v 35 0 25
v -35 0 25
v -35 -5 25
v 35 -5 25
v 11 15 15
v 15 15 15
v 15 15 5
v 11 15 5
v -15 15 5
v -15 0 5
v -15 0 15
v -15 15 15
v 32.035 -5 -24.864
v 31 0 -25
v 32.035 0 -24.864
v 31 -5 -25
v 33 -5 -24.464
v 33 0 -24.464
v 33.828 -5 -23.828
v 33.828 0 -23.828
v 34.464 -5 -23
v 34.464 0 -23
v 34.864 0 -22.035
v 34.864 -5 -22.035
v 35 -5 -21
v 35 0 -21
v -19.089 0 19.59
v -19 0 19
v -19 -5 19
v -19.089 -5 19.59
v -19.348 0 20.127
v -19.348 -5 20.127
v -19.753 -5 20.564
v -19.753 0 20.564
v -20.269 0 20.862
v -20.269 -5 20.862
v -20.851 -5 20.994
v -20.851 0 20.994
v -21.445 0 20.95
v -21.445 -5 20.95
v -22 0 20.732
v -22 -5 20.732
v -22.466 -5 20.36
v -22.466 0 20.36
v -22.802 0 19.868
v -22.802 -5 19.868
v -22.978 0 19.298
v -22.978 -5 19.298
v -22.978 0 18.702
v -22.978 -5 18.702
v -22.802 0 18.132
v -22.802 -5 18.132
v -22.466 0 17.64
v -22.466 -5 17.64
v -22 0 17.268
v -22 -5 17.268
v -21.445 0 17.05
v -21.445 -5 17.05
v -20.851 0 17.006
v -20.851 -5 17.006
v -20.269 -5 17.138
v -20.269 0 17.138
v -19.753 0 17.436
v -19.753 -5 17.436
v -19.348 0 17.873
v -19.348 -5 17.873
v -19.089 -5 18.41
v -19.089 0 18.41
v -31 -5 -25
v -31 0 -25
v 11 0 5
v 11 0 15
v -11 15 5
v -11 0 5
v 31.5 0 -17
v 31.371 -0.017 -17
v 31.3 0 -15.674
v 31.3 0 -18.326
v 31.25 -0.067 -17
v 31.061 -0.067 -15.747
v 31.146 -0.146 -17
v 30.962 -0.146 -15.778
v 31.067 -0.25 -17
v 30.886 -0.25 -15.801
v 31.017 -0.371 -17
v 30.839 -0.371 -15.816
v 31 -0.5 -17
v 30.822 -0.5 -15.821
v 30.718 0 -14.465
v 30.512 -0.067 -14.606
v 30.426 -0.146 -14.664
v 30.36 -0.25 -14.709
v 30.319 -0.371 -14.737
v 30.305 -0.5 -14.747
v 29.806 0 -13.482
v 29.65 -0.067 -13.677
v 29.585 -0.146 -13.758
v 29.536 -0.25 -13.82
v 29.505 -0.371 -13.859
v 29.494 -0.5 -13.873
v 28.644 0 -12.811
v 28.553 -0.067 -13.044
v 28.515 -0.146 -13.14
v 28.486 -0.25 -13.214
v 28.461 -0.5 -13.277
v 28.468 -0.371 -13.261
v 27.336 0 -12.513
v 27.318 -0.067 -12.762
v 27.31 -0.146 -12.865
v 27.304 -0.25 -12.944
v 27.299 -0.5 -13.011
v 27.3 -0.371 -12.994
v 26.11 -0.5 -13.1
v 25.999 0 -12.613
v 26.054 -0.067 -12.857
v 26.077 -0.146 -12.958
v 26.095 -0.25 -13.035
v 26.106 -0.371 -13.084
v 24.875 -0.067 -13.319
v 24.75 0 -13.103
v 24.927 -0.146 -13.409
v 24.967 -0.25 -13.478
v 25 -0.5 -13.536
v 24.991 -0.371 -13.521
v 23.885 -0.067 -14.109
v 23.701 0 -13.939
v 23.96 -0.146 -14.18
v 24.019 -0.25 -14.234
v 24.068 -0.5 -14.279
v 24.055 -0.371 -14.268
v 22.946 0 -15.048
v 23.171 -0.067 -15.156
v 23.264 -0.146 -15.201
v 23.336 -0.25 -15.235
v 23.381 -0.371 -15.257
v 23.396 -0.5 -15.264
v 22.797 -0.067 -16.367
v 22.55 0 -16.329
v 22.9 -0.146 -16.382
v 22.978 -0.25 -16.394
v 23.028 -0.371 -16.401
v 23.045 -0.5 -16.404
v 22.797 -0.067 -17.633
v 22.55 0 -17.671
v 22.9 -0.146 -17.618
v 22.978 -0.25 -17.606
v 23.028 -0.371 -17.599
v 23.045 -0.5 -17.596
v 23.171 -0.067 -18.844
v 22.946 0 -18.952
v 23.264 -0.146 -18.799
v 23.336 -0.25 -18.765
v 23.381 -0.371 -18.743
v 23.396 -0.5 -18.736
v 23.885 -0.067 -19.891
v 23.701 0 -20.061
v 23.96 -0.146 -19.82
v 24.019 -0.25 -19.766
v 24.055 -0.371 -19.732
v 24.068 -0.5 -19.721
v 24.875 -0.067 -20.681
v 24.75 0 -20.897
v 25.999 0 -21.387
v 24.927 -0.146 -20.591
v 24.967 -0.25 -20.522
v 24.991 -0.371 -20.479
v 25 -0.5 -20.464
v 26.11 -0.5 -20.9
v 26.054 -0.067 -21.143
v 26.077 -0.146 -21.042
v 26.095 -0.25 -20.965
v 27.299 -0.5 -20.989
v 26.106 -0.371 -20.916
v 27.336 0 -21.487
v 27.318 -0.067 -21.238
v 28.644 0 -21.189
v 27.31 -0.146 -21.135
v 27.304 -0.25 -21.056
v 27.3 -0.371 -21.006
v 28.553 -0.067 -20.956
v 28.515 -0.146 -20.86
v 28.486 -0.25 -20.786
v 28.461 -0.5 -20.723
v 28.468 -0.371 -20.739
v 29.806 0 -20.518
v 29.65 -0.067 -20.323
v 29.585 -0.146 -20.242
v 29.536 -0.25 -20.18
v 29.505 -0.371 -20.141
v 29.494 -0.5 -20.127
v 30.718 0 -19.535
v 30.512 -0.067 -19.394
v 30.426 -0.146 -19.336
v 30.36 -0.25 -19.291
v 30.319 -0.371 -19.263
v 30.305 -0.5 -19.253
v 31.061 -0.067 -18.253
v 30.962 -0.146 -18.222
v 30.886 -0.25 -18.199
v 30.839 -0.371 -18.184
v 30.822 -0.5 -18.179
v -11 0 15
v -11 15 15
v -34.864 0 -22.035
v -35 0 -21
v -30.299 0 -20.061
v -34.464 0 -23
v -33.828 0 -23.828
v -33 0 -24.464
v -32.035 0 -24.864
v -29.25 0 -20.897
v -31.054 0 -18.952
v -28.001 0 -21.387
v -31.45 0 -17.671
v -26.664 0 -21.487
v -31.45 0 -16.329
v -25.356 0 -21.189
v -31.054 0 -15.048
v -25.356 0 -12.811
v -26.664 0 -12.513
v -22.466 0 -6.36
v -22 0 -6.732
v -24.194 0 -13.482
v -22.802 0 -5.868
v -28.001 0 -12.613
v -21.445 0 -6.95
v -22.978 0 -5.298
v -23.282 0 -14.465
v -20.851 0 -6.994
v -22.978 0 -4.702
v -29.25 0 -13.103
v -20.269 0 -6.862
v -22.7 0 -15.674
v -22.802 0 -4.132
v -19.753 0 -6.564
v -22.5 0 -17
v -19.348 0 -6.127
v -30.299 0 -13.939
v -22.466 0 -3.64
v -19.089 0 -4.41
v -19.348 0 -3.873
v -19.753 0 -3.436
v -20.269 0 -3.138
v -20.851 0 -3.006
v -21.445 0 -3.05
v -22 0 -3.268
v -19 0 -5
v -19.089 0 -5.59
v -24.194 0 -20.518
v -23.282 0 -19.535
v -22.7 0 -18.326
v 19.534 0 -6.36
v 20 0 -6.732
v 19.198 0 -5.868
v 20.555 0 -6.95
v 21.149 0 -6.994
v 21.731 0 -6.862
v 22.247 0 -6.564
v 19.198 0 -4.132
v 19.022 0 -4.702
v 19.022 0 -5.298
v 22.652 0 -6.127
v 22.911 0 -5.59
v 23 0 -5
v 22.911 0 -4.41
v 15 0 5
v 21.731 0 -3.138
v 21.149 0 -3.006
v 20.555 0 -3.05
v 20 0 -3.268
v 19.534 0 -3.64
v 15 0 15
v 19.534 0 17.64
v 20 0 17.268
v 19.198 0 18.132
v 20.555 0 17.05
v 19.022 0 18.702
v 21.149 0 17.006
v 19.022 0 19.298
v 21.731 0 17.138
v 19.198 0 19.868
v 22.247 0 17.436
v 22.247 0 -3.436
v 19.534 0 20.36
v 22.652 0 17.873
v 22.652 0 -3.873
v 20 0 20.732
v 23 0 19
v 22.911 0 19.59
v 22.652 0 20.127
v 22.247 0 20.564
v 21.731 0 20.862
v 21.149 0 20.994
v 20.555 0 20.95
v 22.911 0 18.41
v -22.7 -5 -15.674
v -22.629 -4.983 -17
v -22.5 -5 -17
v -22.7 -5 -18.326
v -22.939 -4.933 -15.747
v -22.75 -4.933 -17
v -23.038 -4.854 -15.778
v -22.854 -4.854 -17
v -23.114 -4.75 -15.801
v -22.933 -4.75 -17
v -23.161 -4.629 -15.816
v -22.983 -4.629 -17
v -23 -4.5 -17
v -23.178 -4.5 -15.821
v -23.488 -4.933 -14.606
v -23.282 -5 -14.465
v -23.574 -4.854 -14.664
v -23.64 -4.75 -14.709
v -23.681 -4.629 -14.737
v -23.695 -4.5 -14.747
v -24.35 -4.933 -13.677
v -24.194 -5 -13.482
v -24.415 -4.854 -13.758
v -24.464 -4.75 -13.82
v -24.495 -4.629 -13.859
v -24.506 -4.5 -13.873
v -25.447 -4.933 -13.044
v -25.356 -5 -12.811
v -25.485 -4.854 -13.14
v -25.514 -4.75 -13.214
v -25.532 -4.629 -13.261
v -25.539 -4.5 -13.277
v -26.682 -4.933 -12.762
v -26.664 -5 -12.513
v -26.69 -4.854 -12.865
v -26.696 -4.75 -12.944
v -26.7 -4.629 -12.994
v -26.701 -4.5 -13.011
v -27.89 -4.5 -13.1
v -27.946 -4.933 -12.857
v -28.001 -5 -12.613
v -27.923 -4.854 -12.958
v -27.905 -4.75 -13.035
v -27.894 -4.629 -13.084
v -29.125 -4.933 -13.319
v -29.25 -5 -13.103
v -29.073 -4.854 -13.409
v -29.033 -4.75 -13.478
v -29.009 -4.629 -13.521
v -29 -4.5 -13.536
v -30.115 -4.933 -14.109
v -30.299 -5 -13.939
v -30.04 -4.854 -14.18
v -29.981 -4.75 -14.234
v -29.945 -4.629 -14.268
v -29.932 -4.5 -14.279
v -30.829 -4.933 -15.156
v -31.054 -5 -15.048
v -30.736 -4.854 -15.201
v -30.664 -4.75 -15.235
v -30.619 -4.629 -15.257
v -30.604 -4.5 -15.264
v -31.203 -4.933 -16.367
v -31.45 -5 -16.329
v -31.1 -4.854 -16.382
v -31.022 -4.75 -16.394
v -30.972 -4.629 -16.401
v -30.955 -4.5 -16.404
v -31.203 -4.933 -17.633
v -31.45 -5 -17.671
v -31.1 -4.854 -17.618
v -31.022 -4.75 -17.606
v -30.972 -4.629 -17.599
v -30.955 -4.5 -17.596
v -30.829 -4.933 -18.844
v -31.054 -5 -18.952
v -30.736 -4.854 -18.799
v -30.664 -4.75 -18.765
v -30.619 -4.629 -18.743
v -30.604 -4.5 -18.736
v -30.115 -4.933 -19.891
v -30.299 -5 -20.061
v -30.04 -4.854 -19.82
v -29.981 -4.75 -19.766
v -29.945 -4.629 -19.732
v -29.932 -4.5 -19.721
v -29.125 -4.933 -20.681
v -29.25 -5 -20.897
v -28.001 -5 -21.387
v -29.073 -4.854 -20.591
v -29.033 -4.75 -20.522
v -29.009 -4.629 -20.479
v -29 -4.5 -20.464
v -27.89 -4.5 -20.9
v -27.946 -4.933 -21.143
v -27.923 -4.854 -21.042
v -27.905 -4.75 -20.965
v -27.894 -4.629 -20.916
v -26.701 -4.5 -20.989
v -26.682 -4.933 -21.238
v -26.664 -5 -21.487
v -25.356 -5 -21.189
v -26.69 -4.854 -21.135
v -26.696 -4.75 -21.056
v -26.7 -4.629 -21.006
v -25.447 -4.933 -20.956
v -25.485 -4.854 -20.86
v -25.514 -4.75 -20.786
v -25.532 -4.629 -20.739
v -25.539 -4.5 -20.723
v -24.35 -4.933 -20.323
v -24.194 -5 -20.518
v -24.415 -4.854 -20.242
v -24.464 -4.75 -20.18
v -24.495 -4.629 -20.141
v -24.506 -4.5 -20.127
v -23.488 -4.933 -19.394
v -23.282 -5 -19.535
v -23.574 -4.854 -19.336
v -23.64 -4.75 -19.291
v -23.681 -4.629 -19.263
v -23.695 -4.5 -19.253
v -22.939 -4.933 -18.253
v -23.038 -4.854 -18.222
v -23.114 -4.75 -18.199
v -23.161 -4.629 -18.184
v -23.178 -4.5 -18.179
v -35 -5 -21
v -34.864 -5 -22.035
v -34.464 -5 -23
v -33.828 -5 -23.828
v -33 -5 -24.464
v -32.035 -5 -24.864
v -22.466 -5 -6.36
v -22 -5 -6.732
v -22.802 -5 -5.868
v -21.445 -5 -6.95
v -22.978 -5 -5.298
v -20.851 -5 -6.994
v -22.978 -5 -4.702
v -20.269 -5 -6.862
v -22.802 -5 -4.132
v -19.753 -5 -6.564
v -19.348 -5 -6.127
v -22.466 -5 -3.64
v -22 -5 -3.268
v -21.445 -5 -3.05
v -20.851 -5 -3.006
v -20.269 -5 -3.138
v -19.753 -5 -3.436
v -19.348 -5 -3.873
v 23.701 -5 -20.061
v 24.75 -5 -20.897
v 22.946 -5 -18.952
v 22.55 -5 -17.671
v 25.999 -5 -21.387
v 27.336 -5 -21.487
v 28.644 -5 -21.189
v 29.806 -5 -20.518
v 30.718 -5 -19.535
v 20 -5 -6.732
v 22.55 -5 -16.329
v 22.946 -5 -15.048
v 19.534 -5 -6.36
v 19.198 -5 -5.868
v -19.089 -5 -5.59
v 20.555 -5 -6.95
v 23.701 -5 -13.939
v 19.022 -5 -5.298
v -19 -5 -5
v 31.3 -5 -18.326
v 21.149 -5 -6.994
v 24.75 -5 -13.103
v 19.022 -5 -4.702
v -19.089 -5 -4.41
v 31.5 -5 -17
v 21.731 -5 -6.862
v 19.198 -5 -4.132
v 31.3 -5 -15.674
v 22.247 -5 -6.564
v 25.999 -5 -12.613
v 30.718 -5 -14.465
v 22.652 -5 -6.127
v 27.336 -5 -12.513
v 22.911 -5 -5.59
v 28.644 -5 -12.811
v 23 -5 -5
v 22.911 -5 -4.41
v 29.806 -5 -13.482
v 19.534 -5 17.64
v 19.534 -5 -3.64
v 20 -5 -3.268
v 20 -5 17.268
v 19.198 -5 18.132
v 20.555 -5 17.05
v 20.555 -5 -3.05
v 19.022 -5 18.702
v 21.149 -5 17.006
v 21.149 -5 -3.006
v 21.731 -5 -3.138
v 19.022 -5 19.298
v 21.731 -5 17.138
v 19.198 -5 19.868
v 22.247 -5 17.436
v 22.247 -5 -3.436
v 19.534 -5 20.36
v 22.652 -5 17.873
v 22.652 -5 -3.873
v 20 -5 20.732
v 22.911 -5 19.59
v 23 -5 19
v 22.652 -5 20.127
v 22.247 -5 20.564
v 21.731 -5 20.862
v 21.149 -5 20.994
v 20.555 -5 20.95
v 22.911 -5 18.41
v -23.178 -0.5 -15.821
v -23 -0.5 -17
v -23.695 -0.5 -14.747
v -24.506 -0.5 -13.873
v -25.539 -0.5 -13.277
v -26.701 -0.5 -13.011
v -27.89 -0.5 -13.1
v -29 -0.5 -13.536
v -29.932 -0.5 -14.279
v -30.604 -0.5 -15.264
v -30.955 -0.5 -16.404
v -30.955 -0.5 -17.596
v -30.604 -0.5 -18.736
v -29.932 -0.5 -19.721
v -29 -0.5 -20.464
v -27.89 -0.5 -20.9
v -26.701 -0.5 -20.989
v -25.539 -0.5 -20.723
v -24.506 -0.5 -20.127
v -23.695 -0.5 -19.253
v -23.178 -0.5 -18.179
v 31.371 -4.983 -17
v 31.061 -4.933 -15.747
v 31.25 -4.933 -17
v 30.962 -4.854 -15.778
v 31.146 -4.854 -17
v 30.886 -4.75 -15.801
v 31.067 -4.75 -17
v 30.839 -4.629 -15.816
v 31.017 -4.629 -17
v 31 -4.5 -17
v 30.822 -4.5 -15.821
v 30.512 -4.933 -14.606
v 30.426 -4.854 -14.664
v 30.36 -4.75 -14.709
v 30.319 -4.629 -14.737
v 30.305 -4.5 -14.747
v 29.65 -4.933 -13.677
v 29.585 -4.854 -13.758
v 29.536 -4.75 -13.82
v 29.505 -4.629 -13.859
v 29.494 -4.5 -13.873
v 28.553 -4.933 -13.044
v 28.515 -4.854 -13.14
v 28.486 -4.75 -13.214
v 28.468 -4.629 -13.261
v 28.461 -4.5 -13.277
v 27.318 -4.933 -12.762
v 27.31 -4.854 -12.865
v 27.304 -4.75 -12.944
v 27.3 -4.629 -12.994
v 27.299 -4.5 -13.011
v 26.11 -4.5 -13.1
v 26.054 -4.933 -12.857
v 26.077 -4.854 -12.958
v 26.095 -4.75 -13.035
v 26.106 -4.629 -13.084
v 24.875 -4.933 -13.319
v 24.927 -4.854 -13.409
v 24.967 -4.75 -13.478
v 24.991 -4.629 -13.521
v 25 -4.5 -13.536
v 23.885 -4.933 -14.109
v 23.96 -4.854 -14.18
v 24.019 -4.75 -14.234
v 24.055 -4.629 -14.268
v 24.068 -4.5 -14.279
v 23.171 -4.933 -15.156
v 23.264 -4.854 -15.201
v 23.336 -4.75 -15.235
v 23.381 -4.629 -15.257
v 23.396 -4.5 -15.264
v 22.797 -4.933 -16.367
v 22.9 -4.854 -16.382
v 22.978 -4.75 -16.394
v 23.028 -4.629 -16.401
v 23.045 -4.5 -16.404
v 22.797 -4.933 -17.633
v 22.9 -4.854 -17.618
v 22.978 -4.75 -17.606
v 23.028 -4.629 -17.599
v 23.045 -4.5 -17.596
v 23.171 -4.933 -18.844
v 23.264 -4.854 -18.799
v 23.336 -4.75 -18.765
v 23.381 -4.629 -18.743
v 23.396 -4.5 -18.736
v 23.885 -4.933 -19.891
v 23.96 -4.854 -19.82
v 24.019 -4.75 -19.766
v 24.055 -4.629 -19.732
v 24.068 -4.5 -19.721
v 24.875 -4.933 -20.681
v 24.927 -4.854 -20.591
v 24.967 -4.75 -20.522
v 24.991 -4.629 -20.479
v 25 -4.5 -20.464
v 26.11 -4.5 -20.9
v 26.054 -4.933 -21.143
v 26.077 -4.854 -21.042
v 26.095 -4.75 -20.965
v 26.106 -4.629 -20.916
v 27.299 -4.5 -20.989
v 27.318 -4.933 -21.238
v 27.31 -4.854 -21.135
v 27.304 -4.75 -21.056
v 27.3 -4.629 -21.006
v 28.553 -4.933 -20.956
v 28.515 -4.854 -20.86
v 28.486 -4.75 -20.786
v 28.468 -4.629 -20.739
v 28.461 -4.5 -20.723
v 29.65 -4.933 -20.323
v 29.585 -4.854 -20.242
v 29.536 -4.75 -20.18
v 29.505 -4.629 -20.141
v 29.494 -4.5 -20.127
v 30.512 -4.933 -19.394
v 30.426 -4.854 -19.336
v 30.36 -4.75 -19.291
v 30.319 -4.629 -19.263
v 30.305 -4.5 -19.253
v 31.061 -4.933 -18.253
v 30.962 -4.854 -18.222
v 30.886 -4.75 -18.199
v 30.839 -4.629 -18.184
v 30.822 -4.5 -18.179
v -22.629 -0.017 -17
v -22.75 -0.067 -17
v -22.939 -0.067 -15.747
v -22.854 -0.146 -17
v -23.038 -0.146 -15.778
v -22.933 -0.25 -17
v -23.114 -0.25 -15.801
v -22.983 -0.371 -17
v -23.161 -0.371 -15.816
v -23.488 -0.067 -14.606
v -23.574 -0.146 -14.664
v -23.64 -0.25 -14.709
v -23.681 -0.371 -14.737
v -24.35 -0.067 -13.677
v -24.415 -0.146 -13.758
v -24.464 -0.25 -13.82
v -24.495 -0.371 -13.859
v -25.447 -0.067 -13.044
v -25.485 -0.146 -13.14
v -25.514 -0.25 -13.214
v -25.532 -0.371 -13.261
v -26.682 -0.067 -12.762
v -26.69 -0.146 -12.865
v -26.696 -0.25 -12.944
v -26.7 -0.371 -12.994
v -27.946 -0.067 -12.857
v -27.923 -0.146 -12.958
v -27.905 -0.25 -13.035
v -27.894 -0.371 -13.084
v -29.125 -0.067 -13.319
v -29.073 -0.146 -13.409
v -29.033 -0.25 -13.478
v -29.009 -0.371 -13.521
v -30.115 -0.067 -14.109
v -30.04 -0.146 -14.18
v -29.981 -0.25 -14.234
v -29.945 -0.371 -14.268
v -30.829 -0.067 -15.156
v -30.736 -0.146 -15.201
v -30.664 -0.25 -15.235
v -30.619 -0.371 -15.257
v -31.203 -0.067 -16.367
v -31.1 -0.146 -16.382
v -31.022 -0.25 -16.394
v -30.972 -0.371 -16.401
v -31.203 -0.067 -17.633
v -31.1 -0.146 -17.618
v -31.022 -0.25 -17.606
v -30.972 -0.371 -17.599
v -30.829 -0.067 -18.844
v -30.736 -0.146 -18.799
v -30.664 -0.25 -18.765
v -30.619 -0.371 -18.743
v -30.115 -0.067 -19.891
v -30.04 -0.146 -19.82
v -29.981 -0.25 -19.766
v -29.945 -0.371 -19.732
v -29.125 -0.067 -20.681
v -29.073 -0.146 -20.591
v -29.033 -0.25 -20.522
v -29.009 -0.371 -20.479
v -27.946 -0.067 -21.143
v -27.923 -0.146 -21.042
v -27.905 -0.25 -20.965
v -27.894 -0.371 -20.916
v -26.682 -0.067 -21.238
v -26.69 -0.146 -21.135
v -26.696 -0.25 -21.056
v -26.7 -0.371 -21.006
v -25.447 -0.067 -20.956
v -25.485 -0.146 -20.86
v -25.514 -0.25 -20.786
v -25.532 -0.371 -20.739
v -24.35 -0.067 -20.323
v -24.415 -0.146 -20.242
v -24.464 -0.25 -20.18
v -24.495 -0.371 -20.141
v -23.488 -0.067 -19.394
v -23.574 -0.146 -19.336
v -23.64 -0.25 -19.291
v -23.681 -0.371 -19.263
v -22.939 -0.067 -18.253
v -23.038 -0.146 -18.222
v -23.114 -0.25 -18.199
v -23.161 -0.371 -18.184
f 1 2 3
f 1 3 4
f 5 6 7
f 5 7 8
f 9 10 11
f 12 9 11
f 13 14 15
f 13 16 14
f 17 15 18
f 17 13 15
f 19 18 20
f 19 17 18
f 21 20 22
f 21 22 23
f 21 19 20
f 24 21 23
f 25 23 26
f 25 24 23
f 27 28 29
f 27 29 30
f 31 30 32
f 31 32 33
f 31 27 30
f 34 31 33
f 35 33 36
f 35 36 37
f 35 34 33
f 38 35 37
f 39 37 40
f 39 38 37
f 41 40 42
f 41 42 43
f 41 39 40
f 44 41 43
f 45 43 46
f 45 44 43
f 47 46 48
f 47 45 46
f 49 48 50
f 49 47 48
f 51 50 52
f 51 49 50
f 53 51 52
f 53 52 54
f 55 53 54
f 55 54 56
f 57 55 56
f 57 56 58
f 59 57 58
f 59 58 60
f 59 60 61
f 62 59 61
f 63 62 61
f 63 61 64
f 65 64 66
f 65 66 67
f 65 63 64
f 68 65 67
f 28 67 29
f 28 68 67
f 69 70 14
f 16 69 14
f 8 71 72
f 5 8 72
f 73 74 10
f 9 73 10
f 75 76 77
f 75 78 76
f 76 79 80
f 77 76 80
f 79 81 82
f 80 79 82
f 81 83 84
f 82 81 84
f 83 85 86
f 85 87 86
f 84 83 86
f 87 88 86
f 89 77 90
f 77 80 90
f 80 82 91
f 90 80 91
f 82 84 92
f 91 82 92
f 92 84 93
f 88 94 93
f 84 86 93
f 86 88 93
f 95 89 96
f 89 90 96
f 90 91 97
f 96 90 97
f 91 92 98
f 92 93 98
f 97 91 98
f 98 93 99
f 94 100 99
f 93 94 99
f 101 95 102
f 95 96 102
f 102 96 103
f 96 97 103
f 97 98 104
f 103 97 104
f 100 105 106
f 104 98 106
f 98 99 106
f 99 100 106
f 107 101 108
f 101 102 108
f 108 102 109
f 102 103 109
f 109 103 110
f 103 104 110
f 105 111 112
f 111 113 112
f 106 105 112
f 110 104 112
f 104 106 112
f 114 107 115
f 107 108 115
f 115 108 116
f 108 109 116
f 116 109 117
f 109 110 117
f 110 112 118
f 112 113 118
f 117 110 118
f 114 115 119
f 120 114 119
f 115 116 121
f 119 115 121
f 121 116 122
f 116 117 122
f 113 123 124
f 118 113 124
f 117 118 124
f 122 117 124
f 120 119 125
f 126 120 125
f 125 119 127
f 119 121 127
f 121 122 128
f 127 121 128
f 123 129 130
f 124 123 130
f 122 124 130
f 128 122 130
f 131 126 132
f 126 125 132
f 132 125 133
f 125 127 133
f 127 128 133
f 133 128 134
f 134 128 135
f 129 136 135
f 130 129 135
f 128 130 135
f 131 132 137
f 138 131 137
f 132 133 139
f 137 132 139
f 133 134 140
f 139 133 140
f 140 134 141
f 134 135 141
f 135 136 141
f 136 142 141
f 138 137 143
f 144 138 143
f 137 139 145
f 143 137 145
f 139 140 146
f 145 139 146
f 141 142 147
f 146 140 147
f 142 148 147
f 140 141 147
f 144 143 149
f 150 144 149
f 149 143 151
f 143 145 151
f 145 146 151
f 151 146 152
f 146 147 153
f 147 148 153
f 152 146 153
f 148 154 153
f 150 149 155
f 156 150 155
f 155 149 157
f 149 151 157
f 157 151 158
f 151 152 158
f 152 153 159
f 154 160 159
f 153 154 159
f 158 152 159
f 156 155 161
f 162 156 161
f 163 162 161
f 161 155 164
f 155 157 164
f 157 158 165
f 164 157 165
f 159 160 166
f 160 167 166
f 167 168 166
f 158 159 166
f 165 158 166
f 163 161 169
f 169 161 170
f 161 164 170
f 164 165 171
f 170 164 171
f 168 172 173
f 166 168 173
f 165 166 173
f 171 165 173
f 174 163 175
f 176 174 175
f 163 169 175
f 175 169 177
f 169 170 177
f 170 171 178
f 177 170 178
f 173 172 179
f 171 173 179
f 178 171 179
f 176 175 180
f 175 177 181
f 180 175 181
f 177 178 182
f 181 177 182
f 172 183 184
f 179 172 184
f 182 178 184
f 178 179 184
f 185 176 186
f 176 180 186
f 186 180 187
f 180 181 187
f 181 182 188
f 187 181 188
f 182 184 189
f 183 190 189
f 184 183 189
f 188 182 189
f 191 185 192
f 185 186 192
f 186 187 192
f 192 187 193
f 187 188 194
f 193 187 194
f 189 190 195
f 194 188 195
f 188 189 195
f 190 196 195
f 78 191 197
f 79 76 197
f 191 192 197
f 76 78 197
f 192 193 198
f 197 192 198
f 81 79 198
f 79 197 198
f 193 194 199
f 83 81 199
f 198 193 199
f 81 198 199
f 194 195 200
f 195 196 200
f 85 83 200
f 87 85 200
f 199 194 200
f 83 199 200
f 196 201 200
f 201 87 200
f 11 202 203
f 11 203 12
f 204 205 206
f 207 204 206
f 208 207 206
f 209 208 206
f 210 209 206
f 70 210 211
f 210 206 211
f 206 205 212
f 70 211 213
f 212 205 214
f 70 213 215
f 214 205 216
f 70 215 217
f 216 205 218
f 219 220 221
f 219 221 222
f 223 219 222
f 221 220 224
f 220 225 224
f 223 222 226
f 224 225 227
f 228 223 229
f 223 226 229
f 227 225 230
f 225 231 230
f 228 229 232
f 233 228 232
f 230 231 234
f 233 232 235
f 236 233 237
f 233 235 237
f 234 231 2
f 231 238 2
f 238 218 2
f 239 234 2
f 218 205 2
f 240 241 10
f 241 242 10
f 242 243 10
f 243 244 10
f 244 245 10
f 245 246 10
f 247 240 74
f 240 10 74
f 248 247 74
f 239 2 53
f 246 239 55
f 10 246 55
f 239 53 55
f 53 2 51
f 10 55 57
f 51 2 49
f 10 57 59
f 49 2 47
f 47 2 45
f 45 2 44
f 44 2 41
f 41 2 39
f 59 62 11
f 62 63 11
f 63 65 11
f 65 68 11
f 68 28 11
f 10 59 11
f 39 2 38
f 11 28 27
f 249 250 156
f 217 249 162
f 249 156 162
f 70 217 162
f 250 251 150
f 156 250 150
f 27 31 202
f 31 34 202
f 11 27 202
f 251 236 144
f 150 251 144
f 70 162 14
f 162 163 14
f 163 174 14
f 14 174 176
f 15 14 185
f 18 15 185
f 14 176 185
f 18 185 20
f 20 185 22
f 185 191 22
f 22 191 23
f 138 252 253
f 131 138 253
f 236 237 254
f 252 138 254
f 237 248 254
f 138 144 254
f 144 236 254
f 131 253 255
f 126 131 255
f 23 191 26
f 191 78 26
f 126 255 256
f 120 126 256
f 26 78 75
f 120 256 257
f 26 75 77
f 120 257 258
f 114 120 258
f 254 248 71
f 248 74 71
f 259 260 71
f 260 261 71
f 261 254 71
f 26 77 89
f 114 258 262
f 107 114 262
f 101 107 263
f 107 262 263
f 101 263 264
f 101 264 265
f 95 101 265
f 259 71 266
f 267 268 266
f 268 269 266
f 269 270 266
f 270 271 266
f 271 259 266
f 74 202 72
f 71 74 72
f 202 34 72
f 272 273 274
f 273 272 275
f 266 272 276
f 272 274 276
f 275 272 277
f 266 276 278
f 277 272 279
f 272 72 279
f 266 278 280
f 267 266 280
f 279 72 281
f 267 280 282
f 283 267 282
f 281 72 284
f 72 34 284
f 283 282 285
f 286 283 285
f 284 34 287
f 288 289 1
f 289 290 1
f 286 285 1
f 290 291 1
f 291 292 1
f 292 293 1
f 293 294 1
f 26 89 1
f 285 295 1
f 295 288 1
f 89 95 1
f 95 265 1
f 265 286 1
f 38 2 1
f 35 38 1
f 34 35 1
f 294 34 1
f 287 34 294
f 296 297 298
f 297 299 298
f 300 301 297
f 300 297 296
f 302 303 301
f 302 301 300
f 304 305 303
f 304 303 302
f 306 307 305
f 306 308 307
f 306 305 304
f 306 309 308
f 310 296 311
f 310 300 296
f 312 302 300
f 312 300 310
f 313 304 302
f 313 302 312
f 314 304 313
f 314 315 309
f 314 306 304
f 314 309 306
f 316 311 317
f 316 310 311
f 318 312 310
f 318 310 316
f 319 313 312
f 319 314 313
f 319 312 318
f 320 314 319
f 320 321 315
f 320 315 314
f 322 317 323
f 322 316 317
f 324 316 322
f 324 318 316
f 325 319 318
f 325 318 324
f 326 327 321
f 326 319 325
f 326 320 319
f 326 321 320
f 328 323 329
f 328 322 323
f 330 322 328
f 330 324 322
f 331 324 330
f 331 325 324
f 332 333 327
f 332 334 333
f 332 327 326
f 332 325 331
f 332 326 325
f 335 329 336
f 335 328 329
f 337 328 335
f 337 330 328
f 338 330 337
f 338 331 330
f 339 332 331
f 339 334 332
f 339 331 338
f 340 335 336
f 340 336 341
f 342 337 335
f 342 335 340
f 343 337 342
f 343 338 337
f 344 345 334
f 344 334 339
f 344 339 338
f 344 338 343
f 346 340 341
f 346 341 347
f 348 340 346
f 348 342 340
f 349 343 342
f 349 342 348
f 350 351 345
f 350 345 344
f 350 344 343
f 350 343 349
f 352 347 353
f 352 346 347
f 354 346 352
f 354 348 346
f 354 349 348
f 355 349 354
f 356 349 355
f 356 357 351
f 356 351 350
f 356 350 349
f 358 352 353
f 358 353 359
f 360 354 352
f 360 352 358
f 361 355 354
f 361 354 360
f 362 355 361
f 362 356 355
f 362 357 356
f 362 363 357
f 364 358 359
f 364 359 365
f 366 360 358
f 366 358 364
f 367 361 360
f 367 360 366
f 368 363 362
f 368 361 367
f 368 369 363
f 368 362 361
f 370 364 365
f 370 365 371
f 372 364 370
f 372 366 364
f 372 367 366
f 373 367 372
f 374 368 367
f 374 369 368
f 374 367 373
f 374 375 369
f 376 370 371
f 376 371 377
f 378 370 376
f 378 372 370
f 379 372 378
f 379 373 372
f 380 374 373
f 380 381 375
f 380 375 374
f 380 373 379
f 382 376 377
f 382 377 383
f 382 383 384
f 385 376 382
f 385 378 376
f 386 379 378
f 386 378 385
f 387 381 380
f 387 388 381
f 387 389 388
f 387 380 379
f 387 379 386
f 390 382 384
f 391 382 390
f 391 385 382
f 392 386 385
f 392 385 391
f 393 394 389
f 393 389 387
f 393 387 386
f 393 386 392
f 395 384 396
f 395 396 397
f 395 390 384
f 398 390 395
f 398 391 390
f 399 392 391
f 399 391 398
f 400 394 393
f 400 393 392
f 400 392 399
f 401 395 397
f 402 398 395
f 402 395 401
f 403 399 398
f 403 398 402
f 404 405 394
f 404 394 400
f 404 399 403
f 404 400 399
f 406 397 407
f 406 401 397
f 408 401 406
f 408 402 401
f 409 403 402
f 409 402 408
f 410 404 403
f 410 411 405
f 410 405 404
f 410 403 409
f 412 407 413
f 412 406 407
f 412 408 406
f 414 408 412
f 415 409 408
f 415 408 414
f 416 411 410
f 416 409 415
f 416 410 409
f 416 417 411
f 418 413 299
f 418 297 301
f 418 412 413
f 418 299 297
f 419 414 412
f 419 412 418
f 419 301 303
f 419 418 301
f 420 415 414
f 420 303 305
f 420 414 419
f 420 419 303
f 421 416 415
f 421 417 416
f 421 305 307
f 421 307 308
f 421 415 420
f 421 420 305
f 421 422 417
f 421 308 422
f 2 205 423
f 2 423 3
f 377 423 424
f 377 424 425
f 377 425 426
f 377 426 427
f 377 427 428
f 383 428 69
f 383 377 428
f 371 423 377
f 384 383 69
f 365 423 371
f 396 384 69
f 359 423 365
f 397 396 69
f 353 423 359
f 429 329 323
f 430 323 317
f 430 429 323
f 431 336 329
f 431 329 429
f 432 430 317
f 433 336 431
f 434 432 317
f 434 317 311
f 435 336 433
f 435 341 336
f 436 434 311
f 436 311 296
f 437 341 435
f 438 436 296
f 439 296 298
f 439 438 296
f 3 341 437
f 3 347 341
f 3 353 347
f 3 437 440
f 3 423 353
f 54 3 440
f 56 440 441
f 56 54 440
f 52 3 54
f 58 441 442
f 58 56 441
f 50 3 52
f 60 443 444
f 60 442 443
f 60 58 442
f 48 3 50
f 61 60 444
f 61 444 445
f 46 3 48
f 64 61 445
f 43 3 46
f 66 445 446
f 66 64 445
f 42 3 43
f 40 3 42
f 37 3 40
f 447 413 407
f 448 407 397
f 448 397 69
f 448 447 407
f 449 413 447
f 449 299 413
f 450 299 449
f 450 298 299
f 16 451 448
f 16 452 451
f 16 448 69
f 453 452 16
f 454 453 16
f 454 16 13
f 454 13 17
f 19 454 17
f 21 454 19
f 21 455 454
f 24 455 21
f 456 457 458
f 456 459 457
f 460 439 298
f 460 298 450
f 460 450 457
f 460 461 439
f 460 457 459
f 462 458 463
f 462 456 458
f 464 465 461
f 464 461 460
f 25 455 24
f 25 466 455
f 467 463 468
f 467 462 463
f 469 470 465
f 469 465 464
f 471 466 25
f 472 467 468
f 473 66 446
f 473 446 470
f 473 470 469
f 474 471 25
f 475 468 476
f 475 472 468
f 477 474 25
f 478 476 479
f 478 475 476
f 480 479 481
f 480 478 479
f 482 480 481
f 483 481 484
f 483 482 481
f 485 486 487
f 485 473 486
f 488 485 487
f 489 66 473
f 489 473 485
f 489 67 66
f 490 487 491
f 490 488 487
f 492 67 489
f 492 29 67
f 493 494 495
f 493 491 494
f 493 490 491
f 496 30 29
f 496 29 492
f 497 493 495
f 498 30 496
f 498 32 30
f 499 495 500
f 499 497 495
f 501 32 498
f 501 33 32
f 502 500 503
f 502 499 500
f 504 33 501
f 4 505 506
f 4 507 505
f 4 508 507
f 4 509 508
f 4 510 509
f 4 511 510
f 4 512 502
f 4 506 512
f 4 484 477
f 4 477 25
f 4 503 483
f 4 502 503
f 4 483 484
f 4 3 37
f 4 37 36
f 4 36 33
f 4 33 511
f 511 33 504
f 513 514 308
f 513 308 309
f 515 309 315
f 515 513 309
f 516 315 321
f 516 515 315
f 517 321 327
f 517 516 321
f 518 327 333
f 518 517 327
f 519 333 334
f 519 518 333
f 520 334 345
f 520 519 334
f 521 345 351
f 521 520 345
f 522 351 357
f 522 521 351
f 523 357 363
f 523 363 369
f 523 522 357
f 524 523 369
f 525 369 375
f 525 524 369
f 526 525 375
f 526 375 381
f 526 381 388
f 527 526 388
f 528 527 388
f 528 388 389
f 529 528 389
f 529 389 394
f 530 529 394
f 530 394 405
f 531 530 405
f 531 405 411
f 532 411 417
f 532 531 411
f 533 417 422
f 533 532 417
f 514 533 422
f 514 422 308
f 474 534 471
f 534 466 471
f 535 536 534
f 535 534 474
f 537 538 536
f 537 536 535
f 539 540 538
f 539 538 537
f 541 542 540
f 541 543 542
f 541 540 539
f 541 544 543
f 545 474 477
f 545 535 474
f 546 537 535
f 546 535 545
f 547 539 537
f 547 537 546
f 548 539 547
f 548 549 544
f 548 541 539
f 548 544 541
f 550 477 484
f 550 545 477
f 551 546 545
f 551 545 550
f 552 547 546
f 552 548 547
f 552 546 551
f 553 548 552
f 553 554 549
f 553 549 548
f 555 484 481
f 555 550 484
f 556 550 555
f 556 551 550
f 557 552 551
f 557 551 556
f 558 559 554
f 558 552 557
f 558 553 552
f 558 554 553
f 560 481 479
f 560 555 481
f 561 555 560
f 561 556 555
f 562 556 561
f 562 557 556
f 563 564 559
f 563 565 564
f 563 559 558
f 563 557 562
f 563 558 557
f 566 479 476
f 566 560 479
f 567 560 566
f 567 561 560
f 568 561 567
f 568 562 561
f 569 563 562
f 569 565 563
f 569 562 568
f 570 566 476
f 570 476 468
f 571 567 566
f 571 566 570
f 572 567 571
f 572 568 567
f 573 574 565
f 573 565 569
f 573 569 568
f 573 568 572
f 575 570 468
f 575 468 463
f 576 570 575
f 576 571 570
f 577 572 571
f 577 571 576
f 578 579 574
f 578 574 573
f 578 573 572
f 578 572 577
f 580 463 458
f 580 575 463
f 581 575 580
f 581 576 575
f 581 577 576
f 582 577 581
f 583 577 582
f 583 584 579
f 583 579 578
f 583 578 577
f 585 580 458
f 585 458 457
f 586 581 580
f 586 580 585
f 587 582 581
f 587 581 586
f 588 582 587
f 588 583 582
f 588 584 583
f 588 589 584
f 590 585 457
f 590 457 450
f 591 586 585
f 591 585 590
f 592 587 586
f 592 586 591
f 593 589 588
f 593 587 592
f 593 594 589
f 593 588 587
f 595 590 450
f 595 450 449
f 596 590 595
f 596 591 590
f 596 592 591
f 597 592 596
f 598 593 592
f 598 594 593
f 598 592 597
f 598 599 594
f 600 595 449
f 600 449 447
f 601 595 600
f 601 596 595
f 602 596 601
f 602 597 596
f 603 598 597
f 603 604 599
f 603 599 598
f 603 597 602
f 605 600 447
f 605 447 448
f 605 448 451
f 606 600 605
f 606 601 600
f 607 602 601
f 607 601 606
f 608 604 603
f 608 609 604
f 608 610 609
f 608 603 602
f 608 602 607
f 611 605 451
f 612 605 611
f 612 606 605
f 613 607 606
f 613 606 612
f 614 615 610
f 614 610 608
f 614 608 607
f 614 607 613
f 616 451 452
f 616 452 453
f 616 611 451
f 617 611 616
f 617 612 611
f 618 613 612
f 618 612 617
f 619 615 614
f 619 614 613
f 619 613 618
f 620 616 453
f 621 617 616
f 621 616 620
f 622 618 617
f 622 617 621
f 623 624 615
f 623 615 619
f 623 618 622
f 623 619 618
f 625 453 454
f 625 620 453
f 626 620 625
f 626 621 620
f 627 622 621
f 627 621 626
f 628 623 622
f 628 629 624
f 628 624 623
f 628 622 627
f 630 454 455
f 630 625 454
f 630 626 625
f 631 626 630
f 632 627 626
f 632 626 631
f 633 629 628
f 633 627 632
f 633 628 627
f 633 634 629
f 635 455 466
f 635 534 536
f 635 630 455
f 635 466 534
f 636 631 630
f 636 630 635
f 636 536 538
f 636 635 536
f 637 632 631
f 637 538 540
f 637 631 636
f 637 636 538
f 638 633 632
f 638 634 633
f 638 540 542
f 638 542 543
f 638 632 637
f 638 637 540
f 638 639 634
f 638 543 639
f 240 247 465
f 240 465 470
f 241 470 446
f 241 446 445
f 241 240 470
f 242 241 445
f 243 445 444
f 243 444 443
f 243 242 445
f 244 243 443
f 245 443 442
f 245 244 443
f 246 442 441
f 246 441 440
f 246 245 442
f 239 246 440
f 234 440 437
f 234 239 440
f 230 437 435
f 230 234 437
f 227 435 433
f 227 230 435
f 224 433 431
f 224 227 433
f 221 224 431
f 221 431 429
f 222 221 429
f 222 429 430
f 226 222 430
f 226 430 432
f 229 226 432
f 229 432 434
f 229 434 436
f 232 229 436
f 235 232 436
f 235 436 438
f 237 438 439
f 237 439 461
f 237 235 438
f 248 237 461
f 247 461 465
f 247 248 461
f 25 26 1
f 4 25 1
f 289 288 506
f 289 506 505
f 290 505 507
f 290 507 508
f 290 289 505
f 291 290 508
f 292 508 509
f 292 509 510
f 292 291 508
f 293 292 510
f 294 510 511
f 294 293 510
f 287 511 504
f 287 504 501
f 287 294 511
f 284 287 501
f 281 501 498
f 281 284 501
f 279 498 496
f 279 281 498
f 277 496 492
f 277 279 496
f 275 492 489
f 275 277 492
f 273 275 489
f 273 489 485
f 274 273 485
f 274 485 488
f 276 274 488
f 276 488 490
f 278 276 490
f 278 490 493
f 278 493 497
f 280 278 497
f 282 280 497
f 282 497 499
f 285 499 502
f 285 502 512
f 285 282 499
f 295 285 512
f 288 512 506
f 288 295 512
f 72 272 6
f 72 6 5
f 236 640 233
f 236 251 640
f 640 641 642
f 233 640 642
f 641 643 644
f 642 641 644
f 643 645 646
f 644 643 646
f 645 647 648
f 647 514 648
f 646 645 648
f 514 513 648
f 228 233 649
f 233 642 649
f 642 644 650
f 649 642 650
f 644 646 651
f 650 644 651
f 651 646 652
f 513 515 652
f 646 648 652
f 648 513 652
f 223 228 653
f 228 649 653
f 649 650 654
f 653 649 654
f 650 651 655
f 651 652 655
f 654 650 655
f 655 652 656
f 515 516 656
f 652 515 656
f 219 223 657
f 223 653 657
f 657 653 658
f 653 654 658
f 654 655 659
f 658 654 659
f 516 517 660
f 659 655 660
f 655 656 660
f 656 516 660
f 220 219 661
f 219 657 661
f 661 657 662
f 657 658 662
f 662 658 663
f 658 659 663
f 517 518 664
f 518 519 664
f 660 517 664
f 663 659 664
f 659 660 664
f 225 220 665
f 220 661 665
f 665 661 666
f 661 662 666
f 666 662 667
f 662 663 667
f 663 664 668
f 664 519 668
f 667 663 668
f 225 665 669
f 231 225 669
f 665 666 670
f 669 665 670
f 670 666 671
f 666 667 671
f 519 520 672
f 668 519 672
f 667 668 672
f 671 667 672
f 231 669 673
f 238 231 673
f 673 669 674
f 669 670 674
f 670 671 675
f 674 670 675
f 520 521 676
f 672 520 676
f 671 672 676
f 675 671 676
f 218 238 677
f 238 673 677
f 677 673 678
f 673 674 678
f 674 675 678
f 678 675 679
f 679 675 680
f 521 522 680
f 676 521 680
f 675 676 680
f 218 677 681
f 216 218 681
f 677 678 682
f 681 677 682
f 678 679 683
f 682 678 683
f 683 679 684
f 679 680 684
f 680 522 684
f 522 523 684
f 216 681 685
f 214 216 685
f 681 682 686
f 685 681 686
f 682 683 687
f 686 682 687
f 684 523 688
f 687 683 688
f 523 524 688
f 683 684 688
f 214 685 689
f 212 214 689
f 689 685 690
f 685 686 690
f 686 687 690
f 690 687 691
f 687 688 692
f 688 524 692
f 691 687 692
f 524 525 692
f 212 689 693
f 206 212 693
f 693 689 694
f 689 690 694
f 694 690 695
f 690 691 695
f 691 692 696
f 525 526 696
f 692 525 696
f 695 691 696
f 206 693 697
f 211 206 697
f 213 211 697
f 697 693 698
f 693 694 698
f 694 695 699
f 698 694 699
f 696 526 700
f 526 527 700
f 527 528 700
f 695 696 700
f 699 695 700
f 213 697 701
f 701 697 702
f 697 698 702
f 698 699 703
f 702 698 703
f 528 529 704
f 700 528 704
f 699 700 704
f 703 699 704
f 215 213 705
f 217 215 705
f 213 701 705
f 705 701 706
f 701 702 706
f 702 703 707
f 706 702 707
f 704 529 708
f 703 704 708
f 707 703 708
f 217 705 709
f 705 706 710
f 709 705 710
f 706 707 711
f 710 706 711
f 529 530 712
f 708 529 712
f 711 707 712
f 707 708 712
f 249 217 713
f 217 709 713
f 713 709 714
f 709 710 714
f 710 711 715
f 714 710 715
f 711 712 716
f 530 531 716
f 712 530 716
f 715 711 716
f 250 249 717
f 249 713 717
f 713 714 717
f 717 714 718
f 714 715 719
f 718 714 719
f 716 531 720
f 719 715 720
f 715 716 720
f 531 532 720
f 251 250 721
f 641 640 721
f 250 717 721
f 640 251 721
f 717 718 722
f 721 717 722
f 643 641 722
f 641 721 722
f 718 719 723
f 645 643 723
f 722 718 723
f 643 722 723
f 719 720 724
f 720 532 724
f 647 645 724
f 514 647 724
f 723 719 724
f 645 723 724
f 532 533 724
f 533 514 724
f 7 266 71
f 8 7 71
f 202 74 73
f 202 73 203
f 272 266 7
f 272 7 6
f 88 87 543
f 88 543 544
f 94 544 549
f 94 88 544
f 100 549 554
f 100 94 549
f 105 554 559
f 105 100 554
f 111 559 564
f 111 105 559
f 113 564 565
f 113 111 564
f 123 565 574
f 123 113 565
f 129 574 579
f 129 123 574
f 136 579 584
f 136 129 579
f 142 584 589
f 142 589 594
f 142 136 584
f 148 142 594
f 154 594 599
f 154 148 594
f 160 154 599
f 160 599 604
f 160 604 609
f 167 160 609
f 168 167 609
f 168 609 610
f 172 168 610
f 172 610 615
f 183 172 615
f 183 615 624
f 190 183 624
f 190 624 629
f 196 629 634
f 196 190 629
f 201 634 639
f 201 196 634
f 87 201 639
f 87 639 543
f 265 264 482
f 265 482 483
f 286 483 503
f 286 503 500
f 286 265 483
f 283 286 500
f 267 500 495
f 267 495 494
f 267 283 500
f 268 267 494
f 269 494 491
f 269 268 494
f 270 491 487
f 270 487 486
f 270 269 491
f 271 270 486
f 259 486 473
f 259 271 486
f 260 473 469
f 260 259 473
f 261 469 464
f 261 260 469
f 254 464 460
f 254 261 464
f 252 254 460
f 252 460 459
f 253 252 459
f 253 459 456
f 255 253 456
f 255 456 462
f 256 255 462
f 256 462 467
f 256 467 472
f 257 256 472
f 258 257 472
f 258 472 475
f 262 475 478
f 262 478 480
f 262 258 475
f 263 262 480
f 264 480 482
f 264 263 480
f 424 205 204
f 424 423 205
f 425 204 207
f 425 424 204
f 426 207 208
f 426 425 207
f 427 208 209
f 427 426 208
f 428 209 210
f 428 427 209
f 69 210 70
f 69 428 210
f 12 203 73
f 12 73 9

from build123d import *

# Parameters (mm, degrees)
F0_W     = 70
F0_H     = 50
F0_R     = 4
F0_R_2   = 2
F1_DEPTH = 5
F2_R     = 4
F3_R     = 0.5
F4_W     = 4
F4_H     = 10
F5_DEPTH = 15


with BuildPart() as f1:
    # F0 (on Front) → F1 (new body)
    with BuildSketch(Plane.XZ):
        Rectangle(F0_W, F0_H)
        with Locations((-27, -17)):
            Circle(F0_R, mode=Mode.SUBTRACT)
        with Locations((-21, -5)):
            Circle(F0_R_2, mode=Mode.SUBTRACT)
        with Locations((27, -17)):
            Circle(F0_R, mode=Mode.SUBTRACT)
        with Locations((21, -5)):
            Circle(F0_R_2, mode=Mode.SUBTRACT)
        with Locations((-21, 19)):
            Circle(F0_R_2, mode=Mode.SUBTRACT)
        with Locations((21, 19)):
            Circle(F0_R_2, mode=Mode.SUBTRACT)
    extrude(amount=F1_DEPTH)

    # F2
    f2_edges = [f1.edges().sort_by_distance(p)[0] for p in [
        (35, -2.5, -25),
        (-35, -2.5, -25),
    ]]
    fillet(f2_edges, radius=F2_R)

    # F3
    f3_edges = [f1.edges().sort_by_distance(p)[0] for p in [
        (-31, -5, -17),
        (23, -5, -17),
        (-31, 0, -17),
        (23, 0, -17),
    ]]
    fillet(f3_edges, radius=F3_R)

    # F4 (on face) → F5 (join)
    with BuildSketch(Plane(origin=(0, 0, 0), x_dir=(-1, 0, 0), z_dir=(0, 1, 0))):
        with Locations((-13, 10)):
            Rectangle(F4_W, F4_H)
        with Locations((13, 10)):
            Rectangle(F4_W, F4_H)
    extrude(amount=F5_DEPTH)


solid = f1.part
